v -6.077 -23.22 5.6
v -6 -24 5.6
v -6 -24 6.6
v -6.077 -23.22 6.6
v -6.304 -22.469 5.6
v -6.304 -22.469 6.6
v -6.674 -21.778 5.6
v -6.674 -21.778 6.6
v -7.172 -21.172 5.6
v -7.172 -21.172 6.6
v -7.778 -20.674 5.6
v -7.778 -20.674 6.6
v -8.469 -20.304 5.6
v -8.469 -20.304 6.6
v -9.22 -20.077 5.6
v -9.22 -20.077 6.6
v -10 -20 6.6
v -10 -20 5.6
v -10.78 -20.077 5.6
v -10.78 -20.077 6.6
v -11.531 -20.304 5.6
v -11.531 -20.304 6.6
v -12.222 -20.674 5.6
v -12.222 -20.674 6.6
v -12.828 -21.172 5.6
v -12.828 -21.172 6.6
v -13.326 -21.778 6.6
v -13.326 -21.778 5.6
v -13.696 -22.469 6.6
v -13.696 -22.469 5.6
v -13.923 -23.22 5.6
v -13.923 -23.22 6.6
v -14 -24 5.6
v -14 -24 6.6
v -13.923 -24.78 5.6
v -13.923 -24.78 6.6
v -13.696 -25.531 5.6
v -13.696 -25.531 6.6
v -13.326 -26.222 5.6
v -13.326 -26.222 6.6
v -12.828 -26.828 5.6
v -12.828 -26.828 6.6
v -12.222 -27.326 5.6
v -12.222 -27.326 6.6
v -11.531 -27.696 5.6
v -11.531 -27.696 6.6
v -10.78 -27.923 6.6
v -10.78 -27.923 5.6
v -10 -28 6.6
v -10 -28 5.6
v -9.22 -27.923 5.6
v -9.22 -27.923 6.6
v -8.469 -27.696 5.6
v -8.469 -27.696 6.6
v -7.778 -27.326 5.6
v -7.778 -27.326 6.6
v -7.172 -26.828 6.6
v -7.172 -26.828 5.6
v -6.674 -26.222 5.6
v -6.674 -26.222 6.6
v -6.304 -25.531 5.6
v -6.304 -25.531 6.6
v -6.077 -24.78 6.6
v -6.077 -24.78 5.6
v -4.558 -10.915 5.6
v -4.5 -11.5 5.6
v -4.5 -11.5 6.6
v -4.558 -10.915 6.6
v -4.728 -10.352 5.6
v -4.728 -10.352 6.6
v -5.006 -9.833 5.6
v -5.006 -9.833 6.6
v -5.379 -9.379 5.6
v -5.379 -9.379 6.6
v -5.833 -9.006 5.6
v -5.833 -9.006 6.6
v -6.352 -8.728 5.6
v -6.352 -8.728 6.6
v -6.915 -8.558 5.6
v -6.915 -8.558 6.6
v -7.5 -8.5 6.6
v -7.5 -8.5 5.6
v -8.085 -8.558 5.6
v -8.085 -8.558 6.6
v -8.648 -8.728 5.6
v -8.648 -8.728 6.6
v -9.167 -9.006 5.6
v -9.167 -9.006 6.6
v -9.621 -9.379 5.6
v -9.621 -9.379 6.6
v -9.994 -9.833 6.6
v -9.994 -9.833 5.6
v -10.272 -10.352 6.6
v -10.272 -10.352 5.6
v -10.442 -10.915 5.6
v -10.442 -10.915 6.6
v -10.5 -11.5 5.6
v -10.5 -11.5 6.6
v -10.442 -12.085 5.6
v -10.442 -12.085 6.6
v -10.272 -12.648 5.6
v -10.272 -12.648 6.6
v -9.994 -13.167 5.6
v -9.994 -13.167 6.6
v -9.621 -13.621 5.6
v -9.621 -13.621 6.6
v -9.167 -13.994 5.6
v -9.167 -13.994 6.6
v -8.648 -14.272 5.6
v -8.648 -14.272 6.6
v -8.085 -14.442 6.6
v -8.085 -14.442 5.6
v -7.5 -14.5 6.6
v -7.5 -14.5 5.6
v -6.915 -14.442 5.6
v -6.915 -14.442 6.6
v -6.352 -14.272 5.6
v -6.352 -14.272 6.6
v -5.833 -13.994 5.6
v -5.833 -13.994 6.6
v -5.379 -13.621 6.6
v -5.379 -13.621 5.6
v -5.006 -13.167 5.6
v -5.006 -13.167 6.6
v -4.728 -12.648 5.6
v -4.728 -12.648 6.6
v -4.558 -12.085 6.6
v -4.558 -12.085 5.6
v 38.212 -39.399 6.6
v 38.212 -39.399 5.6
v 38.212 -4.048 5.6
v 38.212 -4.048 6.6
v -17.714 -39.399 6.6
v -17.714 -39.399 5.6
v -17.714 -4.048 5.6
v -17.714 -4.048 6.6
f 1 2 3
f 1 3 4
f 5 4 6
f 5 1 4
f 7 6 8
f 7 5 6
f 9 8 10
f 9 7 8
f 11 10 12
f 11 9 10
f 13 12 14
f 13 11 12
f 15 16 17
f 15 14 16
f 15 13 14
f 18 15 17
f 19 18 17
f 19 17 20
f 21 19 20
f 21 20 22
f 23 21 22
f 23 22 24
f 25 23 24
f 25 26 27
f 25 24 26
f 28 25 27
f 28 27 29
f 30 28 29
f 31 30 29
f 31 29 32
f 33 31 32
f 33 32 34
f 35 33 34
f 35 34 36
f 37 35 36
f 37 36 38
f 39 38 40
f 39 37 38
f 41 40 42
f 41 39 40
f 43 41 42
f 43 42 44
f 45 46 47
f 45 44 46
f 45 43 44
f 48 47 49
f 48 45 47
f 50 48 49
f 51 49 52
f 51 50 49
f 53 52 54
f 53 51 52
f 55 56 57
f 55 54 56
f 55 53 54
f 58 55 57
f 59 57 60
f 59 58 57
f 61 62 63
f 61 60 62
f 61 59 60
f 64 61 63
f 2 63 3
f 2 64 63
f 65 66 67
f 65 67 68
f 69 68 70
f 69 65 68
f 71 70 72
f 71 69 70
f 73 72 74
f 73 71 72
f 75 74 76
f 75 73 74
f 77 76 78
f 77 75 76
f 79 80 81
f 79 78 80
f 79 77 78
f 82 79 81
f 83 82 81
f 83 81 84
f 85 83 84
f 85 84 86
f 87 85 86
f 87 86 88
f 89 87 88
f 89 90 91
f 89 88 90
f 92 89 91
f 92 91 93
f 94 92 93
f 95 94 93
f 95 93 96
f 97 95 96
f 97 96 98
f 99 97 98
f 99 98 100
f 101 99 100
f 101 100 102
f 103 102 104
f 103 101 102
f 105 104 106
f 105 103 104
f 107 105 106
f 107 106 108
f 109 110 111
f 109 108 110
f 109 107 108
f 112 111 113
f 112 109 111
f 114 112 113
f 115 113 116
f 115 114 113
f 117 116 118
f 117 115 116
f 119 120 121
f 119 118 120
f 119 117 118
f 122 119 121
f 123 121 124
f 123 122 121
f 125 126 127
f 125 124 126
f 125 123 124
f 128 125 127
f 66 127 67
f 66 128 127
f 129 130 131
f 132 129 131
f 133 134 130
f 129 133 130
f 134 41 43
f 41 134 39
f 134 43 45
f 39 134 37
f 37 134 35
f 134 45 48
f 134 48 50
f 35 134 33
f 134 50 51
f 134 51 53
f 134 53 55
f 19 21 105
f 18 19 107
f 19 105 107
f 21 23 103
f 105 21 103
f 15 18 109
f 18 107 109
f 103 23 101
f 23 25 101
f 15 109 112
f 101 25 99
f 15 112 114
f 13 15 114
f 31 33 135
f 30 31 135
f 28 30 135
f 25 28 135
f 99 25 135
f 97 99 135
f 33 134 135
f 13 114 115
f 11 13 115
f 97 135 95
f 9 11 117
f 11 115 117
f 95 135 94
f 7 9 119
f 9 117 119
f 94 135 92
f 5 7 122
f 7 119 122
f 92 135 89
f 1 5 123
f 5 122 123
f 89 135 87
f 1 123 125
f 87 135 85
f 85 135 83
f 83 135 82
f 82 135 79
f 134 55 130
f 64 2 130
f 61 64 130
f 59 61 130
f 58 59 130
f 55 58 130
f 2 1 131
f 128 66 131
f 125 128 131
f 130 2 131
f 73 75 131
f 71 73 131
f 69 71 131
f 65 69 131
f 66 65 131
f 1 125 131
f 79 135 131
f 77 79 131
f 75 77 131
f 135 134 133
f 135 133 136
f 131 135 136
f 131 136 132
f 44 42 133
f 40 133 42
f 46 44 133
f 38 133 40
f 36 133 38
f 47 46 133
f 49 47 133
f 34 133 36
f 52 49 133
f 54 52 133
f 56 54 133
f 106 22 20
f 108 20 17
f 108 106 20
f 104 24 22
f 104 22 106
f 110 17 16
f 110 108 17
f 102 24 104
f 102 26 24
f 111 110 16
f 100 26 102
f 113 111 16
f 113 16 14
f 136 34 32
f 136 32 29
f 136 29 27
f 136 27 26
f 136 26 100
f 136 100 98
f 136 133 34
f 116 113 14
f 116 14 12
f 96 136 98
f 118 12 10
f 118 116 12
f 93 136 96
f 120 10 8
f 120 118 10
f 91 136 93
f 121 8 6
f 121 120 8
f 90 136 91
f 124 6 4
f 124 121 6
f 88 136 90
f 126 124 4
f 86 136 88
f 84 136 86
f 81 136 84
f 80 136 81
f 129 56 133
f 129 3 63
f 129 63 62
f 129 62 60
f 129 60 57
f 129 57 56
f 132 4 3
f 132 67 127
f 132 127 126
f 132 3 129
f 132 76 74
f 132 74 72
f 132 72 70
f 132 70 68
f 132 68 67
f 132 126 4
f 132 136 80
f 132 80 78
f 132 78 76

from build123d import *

# Parameters (mm, degrees)
CYLINDER_R        = 3
CYLINDER_DEPTH    = 10
CYLINDER001_R     = 4
CYLINDER001_DEPTH = 10
SKETCH015_W       = 55.926
SKETCH015_H       = 35.3506
EXTRUDE034_DEPTH  = 1


with BuildPart() as cylinder:
    # Cylinder → Cylinder (new body)
    with BuildSketch(Plane(origin=(-7.5, -11.5, 4), x_dir=(1, 0, 0), z_dir=(0, 0, 1))):
        Circle(CYLINDER_R)
    extrude(amount=CYLINDER_DEPTH)


with BuildPart() as cylinder001:
    # Cylinder001 → Cylinder001 (new body)
    with BuildSketch(Plane(origin=(-10, -24, 4), x_dir=(1, 0, 0), z_dir=(0, 0, 1))):
        Circle(CYLINDER001_R)
    extrude(amount=CYLINDER001_DEPTH)


with BuildPart() as cut001:
    # Sketch015 (on Face6 of Extrude027) → Extrude034 (new body)
    with BuildSketch(Plane.XY.offset(5.6)):
        with Locations((10.249, -21.7237)):
            Rectangle(SKETCH015_W, SKETCH015_H)
    extrude(amount=EXTRUDE034_DEPTH)

    # Cut: cut Cylinder001
    add(cylinder001.part, mode=Mode.SUBTRACT)

    # Cut001: cut Cylinder
    add(cylinder.part, mode=Mode.SUBTRACT)


solid = cut001.part
